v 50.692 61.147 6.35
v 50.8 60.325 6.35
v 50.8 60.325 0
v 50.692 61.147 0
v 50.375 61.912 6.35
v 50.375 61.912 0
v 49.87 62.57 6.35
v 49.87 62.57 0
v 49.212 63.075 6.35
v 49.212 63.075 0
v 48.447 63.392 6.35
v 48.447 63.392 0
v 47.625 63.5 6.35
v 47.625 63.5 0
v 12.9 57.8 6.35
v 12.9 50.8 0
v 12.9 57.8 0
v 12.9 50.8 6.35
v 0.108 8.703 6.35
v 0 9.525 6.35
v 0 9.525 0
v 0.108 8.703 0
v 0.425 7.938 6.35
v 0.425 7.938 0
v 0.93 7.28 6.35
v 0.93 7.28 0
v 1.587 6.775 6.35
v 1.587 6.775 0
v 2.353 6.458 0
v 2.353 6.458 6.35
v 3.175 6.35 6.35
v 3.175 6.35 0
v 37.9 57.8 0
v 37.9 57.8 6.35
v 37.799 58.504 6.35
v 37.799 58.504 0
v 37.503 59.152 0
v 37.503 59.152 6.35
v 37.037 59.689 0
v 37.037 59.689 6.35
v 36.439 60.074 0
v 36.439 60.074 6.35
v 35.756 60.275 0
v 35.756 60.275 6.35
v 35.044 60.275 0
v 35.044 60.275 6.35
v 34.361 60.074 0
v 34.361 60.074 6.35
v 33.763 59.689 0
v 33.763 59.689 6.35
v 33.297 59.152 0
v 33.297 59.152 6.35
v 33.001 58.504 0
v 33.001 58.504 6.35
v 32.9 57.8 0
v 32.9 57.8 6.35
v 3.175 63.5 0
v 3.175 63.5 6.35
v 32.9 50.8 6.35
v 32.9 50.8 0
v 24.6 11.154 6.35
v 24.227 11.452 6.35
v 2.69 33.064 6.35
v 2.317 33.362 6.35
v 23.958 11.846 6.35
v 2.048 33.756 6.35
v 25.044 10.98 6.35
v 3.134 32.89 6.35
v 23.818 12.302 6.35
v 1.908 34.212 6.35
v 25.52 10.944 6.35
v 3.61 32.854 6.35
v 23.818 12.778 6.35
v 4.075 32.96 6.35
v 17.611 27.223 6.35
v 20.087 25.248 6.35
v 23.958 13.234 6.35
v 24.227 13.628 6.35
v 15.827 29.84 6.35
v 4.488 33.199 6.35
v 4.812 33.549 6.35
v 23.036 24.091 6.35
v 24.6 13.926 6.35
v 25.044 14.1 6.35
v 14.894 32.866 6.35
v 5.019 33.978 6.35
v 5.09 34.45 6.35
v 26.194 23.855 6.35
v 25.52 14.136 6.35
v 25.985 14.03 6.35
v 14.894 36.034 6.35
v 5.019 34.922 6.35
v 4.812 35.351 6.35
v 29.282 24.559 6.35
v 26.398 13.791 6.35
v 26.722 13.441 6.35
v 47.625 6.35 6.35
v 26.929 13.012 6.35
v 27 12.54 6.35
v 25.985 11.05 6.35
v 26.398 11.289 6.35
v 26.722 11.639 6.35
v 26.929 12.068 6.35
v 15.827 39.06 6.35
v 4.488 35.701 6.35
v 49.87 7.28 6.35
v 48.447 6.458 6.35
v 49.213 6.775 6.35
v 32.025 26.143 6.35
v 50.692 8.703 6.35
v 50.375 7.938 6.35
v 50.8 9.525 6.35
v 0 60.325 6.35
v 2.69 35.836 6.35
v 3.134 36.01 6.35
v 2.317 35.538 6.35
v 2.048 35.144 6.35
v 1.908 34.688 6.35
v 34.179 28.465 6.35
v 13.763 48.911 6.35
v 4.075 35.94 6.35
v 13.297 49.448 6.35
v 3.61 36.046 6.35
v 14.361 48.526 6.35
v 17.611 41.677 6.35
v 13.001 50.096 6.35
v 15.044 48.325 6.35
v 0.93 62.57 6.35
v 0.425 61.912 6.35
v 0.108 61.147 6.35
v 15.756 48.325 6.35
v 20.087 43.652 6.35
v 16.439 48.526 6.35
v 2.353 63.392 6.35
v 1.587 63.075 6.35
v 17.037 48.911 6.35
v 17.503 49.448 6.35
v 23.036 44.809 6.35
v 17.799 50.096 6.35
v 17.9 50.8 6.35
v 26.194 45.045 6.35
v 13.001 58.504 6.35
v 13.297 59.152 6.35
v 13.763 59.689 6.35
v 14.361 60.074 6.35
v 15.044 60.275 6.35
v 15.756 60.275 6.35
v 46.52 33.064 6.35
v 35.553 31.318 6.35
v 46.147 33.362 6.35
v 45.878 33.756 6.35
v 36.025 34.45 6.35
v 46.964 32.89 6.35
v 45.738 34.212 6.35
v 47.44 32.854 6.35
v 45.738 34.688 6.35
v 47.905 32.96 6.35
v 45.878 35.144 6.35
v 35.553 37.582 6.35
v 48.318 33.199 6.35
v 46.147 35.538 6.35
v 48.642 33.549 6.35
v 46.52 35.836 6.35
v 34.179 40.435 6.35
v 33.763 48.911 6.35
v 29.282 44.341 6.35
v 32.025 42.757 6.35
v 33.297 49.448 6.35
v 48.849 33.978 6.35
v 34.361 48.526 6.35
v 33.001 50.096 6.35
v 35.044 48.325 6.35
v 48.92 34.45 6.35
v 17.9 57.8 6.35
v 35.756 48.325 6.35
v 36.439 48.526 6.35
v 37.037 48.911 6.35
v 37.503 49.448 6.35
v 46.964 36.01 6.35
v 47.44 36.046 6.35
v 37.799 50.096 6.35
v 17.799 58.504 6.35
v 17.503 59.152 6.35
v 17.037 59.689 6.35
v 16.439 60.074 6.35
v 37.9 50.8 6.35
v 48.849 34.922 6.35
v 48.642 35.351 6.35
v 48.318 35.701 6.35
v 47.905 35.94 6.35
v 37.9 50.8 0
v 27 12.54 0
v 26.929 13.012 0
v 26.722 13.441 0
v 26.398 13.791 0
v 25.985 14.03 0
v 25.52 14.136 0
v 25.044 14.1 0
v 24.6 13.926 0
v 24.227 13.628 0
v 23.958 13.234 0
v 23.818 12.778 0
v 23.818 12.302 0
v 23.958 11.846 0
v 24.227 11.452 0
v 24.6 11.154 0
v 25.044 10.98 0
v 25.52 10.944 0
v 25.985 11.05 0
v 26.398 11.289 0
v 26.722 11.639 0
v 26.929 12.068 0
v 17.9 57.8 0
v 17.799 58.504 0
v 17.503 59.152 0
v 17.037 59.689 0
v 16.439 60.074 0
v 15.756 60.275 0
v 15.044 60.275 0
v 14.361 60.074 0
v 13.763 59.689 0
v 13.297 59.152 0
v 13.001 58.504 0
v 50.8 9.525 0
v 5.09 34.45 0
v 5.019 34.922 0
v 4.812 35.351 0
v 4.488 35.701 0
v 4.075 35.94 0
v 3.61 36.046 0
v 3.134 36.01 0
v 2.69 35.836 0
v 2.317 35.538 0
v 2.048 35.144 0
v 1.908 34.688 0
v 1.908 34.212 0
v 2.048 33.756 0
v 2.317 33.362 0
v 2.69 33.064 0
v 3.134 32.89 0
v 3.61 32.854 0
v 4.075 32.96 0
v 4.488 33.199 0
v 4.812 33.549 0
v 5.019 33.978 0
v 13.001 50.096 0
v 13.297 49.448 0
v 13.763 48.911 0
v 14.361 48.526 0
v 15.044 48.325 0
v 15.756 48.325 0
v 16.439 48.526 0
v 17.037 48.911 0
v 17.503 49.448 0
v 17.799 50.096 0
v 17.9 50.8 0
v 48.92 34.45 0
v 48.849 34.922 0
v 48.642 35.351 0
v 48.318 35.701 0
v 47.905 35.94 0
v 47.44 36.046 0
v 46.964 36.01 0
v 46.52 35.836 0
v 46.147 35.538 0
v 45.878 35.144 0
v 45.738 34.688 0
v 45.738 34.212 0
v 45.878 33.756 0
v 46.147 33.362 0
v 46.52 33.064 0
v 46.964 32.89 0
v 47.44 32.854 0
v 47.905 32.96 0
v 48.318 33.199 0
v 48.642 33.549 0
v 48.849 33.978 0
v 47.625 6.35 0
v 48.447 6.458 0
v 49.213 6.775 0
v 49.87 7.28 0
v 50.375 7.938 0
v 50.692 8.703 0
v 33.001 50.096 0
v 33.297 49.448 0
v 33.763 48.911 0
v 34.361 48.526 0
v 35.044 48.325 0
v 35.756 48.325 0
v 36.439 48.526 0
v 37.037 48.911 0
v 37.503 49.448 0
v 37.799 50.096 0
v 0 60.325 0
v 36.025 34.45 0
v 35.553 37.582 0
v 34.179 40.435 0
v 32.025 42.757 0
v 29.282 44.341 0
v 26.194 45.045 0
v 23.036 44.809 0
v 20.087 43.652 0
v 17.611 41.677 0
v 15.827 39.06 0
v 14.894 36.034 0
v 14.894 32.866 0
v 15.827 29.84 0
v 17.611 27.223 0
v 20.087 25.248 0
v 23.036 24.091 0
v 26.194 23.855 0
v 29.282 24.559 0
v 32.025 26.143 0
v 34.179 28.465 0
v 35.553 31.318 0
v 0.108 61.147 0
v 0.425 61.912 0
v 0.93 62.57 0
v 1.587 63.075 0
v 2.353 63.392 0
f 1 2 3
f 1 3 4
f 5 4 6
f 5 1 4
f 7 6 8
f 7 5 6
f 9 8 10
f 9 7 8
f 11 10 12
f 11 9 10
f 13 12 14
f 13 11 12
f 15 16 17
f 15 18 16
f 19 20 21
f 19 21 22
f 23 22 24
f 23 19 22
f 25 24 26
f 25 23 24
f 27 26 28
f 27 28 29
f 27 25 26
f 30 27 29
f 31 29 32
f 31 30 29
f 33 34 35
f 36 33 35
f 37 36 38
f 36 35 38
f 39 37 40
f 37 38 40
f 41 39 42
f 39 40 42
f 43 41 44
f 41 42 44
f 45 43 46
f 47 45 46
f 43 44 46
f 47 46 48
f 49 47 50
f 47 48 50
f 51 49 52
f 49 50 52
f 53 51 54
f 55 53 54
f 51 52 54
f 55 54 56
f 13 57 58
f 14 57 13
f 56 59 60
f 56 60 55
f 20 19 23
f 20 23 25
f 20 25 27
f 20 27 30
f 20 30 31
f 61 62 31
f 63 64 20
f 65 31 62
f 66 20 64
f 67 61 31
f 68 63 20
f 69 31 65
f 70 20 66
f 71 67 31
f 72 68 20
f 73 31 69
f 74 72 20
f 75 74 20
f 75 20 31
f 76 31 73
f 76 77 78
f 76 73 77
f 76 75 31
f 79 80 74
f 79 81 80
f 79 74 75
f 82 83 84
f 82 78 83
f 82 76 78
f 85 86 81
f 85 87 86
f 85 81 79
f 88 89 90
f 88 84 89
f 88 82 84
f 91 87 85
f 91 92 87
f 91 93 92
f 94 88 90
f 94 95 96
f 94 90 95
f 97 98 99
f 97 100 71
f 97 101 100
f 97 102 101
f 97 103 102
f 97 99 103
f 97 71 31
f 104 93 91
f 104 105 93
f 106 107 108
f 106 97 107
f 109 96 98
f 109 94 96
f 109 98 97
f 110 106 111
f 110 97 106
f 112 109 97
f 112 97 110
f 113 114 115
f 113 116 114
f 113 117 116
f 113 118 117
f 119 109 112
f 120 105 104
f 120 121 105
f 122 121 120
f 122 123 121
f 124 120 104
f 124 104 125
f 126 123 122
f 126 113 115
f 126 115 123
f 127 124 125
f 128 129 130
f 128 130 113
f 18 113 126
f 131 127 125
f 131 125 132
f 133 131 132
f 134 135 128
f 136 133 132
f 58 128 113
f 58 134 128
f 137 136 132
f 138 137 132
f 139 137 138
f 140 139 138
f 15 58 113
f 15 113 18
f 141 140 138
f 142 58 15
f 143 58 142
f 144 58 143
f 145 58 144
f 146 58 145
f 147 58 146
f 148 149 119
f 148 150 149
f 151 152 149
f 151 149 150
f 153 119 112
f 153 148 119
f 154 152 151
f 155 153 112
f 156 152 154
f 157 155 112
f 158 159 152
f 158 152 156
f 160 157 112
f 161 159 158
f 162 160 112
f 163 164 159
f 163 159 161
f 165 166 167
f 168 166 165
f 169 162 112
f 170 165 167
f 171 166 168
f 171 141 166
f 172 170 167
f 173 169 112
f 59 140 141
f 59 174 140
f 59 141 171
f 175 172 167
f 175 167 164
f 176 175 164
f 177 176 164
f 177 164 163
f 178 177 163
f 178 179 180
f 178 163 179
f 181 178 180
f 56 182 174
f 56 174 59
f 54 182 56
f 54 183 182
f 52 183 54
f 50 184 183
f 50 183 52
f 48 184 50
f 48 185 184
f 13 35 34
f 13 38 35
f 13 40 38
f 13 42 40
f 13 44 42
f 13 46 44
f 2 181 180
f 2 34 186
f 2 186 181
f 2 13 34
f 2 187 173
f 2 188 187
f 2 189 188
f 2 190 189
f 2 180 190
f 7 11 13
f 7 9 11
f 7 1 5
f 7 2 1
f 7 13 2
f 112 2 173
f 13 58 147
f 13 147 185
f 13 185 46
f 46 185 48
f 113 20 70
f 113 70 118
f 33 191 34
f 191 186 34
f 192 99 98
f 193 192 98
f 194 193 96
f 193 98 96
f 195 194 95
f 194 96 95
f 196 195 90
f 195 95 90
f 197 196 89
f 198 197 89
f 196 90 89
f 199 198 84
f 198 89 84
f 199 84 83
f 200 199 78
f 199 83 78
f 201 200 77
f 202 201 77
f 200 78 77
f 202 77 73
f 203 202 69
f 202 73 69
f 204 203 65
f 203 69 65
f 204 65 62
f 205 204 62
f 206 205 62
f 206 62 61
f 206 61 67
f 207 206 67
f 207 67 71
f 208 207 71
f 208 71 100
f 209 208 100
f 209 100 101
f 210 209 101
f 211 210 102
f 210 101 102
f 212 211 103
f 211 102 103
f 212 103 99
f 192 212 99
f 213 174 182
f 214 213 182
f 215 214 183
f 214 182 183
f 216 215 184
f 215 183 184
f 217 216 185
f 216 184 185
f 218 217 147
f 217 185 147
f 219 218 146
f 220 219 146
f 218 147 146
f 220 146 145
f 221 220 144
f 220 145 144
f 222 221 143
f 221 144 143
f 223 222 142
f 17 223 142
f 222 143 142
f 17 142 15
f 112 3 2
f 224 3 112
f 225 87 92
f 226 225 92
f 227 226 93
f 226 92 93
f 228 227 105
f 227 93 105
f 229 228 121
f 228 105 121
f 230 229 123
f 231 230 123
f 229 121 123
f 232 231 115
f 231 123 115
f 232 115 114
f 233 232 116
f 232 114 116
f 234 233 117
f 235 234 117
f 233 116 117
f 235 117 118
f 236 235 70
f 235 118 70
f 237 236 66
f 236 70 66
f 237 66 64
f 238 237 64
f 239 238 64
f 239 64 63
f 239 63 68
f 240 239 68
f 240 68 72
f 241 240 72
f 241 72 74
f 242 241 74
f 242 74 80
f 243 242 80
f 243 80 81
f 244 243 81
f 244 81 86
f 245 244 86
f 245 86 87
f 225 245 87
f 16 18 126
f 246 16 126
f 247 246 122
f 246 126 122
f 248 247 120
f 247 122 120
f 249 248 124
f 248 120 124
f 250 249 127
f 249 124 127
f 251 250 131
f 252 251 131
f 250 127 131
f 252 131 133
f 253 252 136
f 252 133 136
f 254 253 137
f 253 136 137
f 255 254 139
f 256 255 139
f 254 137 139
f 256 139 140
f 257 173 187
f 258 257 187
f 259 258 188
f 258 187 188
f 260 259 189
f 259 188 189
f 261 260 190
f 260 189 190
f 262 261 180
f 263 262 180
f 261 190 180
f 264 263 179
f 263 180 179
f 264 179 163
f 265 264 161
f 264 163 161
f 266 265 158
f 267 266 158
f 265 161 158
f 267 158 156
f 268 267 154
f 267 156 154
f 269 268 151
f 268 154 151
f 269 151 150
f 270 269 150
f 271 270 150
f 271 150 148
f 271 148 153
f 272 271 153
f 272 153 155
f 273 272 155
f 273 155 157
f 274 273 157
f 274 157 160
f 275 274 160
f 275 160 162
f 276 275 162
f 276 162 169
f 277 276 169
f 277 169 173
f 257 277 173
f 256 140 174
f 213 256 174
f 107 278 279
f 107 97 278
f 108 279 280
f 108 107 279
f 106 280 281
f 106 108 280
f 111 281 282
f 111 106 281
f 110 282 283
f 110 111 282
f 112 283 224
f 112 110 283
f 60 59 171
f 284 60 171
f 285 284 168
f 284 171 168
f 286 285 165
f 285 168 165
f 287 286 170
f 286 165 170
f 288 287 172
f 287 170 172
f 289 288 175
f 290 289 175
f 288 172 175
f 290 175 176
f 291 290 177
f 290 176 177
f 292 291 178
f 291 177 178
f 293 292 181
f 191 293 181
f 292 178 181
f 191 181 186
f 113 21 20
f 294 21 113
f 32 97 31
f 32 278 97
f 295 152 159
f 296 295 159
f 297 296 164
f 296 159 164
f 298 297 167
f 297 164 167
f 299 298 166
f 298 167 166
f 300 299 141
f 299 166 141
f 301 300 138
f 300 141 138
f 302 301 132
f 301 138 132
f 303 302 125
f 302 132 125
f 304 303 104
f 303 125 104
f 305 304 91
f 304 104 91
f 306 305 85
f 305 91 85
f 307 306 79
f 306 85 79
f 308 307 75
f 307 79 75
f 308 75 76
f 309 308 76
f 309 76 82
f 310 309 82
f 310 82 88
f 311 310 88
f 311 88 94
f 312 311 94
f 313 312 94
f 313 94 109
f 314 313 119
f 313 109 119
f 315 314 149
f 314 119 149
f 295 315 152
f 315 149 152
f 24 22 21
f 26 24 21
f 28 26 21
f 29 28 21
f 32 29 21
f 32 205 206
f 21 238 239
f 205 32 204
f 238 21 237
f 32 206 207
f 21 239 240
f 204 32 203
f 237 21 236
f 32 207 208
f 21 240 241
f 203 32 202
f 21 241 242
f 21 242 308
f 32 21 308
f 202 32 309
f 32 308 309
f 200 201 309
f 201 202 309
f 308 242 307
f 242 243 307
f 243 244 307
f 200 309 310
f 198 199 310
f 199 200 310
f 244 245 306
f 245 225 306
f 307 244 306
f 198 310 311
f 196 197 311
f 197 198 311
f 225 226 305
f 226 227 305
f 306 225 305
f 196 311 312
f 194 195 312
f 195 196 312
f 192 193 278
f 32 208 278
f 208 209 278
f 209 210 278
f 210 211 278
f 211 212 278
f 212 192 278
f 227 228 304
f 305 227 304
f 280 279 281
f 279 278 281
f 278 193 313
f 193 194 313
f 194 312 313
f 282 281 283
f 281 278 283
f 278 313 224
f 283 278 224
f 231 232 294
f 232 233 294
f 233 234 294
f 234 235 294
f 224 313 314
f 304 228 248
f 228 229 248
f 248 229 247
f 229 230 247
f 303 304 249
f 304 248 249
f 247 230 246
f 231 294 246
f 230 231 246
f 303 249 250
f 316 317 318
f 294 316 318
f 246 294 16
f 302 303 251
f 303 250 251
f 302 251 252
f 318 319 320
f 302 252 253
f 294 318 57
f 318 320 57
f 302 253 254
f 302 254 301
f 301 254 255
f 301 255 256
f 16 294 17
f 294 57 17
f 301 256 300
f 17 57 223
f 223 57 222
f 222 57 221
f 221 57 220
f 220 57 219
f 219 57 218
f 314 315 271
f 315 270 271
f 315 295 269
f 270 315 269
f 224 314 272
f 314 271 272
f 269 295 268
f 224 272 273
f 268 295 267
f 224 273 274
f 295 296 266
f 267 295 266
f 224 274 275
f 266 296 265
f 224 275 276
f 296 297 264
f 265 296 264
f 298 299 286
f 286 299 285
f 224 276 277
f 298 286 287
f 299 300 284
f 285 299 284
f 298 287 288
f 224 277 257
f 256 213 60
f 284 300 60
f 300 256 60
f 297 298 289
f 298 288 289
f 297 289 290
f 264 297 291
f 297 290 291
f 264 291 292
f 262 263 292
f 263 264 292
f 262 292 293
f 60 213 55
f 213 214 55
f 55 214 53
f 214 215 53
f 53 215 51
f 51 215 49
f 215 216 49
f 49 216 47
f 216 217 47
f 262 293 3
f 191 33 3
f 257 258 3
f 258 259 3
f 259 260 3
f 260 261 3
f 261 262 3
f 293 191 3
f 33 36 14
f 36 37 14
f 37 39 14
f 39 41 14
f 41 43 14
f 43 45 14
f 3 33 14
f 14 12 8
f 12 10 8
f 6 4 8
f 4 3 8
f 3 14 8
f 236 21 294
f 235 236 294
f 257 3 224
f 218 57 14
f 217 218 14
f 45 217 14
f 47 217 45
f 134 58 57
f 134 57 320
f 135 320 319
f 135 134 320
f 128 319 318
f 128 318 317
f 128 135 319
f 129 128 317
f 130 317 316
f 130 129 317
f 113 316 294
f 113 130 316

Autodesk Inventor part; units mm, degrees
ref_plane "YZ Plane" through (0, 0, 0) normal (1, 0, 0) x (0, 1, 0)
ref_plane "XZ Plane" through (0, 0, 0) normal (0, 1, 0) x (-1, 0, 0)
ref_plane "XY Plane" through (0, 0, 0) normal (0, 0, 1) x (1, 0, 0)
sketch "Sketch1" plane through (0, 0, 0) normal (0, 0, 1) x (1, 0, 0)
  line L0 (0, 63.5) -> (50.8, 63.5)
  line L1 (50.8, 63.5) -> (50.8, 6.35)
  line L2 (50.8, 6.35) -> (0, 6.35)
  line L3 (0, 6.35) -> (0, 63.5)
  dimension "d25" = 50.8
  dimension "d26" = 57.15
extrude "Extrusion4" add sketch "Sketch1" along normal blind 6.35
sketch "Sketch3" plane through (0, 0, 6.35) normal (0, 0, 1) x (1, 0, 0)
  line L0 (0, 63.5) -> (50.8, 63.5) projected
  line L1 (0, 6.35) -> (0, 63.5) projected
  circle A0 centre (25.4, 34.45) radius 10.625
  dimension "d29" = 21.25
  dimension "d30" = 25.4
  dimension "d31" = 29.05
extrude "Extrusion5" cut sketch "Sketch3" against normal through all
sketch "Sketch4" plane through (0, 0, 6.35) normal (0, 0, 1) x (1, 0, 0)
  line L0 (0, 63.5) -> (50.8, 63.5) projected
  line L1 (0, 6.35) -> (0, 63.5) projected
  circle A0 centre (3.49, 34.45) radius 1.6002
  circle A1 centre (47.32, 34.45) radius 1.6002
  circle A2 centre (25.4, 12.54) radius 1.6002
  dimension "d37" = 3.2004
  dimension "d38" = 3.49
  dimension "d39" = 29.05
  dimension "d40" = 3.2004
  dimension "d41" = 47.32
  dimension "d42" = 29.05
  dimension "d43" = 3.2004
  dimension "d44" = 25.4
  dimension "d45" = 50.96
extrude "Extrusion6" cut sketch "Sketch4" against normal through all
sketch "Sketch5" plane through (0, 0, 6.35) normal (0, 0, 1) x (1, 0, 0)
  line L0 (0, 63.5) -> (50.8, 63.5) projected
  line L1 (0, 6.35) -> (0, 63.5) projected
  arc A0 (12.9, 50.8) -> (17.9, 50.8) centre (15.4, 50.8) ccw
  line L2 (50.8, 6.35) -> (0, 6.35) projected
  line L3 (12.9, 50.8) -> (12.9, 57.8)
  line L4 (17.9, 50.8) -> (17.9, 57.8)
  arc A1 (17.9, 57.8) -> (12.9, 57.8) centre (15.4, 57.8) ccw
  dimension "d49" = 5
  dimension "d51" = 12.7
  dimension "d53" = 15.4
  dimension "d62" = 7
  dimension "d63" = 7
  dimension "d64" = 5
extrude "Extrusion7" cut sketch "Sketch5" against normal through all
pattern_linear "Rectangular Pattern1" count 2 spacing 20 along (1, 0, 0) of "Extrusion7"
fillet "Fillet1" radius 3.175 4 edges at (0, 63.5, 3.175) (50.8, 63.5, 3.175) (50.8, 6.35, 3.175) (0, 6.35, 3.175)
equation "\"d40\" = d37"
equation "\"d42\" = d39"
equation "\"d43\" = d37"
equation "\"d49\" = d48"
equation "\"d63\" = d62"
equation "\"d48\" = 5"
properties part number "SM-S06" material "Polycarbonate, Smoke"
